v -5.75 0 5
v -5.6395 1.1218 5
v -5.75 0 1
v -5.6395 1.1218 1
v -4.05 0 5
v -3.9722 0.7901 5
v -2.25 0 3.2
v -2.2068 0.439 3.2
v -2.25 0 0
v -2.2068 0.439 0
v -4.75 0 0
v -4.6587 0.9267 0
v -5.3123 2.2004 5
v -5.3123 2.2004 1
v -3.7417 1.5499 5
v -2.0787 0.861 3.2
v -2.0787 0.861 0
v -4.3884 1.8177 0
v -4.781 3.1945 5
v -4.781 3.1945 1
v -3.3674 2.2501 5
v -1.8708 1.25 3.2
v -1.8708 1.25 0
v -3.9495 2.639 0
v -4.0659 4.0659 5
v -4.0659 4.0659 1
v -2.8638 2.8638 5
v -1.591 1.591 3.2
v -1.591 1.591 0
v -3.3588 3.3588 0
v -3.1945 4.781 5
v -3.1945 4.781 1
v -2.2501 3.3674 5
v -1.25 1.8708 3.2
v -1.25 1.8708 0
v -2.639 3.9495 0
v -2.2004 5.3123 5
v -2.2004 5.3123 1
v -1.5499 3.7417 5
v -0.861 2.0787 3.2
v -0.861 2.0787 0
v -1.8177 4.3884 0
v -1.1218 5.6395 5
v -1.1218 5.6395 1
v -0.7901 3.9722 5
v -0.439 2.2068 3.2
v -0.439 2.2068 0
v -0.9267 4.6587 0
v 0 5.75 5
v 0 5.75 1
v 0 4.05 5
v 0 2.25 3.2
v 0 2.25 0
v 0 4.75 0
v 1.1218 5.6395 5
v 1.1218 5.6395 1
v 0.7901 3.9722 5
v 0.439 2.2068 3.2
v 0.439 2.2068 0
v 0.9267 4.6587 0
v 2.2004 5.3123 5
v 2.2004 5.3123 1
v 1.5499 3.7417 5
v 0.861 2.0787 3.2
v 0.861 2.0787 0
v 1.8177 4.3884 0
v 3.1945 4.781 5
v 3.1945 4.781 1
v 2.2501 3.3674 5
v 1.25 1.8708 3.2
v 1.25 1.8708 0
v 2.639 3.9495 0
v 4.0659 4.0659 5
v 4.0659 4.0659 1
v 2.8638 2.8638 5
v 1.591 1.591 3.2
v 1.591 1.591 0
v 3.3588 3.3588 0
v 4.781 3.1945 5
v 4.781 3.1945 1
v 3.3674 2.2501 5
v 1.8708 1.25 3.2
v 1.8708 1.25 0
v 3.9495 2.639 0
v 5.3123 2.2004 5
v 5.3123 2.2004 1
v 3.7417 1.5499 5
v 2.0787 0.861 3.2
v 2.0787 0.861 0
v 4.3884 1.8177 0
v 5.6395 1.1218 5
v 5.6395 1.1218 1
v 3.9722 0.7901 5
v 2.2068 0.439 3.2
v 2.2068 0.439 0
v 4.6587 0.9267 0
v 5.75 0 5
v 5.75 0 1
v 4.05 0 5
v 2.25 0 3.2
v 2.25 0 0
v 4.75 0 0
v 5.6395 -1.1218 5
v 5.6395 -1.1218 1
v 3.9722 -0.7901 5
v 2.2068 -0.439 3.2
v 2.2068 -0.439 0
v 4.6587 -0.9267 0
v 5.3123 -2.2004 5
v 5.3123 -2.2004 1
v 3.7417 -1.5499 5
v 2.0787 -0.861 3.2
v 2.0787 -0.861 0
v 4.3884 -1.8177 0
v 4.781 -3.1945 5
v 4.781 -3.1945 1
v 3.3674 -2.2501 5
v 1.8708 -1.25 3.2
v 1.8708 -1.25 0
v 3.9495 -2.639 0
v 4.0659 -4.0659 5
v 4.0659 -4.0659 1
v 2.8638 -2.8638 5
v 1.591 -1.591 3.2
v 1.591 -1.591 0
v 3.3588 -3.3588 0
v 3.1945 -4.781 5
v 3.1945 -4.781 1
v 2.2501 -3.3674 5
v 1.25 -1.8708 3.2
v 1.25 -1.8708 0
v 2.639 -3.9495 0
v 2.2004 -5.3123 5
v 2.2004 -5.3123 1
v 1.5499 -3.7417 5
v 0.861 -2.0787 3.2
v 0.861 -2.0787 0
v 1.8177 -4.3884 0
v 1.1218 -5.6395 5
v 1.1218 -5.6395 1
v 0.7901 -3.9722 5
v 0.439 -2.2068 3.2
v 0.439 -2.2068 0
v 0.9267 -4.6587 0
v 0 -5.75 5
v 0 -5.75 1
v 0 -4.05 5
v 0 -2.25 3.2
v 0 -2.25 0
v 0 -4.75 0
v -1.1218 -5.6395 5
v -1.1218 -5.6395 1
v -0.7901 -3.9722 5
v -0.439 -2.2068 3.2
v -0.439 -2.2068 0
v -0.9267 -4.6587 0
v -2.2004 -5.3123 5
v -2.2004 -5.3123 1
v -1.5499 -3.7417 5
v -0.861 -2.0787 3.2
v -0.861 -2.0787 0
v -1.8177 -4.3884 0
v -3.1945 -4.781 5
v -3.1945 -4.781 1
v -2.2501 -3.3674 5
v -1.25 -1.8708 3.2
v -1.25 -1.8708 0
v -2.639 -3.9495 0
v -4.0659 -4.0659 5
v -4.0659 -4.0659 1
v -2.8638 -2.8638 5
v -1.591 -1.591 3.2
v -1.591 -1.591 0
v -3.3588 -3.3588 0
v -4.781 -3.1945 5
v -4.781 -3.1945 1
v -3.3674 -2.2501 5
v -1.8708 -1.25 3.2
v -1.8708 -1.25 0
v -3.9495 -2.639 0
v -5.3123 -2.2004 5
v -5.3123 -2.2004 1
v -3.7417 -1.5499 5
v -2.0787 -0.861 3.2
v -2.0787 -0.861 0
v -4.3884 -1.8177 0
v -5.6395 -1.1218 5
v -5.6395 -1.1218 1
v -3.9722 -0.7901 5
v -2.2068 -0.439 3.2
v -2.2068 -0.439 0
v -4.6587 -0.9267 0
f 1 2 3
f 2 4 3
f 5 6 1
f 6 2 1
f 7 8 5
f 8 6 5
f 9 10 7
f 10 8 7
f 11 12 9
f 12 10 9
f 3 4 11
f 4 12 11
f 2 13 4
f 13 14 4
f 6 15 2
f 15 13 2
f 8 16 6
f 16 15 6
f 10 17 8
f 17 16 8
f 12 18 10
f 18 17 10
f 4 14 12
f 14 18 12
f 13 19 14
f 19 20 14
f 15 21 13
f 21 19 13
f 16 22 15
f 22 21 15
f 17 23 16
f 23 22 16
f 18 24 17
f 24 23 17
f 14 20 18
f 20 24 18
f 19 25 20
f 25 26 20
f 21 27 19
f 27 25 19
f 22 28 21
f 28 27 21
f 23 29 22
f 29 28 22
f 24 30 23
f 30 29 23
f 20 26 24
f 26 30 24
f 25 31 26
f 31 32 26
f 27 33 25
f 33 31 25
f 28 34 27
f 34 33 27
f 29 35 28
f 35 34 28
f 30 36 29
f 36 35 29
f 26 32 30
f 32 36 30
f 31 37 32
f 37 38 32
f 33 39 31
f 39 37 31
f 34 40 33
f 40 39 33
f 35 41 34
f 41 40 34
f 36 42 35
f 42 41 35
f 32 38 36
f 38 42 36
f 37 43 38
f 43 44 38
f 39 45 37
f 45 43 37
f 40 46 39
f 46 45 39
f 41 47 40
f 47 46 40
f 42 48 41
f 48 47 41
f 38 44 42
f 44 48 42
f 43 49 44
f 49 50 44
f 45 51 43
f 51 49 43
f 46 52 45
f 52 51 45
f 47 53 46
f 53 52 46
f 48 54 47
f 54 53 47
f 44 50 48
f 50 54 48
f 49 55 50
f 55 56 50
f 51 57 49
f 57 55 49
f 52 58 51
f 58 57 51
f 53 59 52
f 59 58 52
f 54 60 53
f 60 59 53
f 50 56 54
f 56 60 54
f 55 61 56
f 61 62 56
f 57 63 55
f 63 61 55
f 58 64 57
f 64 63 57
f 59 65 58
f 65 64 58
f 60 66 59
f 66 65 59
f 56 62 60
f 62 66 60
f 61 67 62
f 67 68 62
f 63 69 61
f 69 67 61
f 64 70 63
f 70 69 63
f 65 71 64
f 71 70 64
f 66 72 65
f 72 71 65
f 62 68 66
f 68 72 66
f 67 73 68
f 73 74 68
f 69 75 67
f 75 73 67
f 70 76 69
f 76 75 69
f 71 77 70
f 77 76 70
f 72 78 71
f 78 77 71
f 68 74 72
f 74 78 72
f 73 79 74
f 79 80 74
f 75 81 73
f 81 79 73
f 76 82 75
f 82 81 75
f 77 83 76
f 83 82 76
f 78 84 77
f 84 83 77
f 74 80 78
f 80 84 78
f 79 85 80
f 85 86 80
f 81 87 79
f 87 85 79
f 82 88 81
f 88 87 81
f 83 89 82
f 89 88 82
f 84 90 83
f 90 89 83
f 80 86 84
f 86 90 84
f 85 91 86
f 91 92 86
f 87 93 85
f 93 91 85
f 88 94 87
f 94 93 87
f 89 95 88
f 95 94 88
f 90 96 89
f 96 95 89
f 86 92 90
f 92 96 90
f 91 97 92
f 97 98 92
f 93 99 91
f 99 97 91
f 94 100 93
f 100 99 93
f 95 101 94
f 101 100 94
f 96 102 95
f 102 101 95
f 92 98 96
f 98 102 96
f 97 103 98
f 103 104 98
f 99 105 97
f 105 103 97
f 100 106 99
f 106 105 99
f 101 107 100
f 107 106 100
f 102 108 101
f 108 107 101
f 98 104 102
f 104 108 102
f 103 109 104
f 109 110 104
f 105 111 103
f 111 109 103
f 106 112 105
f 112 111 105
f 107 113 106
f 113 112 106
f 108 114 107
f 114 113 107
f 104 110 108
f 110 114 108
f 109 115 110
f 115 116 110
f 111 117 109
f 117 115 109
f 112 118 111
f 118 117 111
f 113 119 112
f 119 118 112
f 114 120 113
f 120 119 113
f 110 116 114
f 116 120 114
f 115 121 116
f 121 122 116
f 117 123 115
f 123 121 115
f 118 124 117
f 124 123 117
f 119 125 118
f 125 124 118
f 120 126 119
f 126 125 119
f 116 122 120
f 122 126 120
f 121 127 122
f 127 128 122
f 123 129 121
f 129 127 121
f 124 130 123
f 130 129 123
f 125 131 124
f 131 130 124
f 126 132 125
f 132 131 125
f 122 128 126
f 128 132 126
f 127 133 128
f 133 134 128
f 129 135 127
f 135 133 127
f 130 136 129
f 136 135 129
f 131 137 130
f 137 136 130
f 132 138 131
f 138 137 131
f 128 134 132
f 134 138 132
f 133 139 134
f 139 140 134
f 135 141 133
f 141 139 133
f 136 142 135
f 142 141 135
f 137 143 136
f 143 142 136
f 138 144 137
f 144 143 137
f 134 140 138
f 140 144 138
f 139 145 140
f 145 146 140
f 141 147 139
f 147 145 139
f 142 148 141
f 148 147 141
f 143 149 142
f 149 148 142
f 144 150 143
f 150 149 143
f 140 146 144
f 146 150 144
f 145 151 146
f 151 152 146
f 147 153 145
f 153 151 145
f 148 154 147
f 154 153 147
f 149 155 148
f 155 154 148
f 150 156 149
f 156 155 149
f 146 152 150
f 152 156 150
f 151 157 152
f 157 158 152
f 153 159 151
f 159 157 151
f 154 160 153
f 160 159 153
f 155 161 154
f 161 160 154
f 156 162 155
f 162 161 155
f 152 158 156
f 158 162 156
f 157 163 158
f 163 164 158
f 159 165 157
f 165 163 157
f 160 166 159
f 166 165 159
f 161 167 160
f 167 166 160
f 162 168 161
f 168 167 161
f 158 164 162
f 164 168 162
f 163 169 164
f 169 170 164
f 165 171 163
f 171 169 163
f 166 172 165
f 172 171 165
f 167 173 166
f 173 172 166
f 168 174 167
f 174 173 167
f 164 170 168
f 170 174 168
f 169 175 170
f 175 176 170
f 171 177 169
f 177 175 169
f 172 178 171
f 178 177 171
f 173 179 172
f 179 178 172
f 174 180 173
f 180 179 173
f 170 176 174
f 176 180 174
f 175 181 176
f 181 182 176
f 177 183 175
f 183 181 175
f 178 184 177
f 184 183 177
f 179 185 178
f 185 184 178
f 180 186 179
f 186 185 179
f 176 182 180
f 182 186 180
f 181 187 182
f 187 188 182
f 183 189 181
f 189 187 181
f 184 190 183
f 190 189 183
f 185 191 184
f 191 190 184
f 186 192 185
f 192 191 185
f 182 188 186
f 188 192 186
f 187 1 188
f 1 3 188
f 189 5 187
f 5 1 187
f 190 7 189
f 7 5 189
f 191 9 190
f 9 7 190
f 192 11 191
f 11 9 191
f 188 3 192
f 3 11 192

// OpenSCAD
$fn = 32;

// ----------------------------------------------------------------------
// Form washer: countersunk washer, 11.5 mm outside, 4.5 mm bore
// ----------------------------------------------------------------------

// --- parameters (mm) ---
revolve_angle = 360;      // full turn around the Z axis
profile_points = 6;       // points of the closed outline

profile = [[2.25, 0], [4.75, 0], [5.75, 1], [5.75, 5], [4.05, 5], [2.25, 3.2]];  // single closed polygon, 6 points, counter clockwise

// --- the one profile operation ---
rotate_extrude(angle = revolve_angle) polygon(points = profile);
